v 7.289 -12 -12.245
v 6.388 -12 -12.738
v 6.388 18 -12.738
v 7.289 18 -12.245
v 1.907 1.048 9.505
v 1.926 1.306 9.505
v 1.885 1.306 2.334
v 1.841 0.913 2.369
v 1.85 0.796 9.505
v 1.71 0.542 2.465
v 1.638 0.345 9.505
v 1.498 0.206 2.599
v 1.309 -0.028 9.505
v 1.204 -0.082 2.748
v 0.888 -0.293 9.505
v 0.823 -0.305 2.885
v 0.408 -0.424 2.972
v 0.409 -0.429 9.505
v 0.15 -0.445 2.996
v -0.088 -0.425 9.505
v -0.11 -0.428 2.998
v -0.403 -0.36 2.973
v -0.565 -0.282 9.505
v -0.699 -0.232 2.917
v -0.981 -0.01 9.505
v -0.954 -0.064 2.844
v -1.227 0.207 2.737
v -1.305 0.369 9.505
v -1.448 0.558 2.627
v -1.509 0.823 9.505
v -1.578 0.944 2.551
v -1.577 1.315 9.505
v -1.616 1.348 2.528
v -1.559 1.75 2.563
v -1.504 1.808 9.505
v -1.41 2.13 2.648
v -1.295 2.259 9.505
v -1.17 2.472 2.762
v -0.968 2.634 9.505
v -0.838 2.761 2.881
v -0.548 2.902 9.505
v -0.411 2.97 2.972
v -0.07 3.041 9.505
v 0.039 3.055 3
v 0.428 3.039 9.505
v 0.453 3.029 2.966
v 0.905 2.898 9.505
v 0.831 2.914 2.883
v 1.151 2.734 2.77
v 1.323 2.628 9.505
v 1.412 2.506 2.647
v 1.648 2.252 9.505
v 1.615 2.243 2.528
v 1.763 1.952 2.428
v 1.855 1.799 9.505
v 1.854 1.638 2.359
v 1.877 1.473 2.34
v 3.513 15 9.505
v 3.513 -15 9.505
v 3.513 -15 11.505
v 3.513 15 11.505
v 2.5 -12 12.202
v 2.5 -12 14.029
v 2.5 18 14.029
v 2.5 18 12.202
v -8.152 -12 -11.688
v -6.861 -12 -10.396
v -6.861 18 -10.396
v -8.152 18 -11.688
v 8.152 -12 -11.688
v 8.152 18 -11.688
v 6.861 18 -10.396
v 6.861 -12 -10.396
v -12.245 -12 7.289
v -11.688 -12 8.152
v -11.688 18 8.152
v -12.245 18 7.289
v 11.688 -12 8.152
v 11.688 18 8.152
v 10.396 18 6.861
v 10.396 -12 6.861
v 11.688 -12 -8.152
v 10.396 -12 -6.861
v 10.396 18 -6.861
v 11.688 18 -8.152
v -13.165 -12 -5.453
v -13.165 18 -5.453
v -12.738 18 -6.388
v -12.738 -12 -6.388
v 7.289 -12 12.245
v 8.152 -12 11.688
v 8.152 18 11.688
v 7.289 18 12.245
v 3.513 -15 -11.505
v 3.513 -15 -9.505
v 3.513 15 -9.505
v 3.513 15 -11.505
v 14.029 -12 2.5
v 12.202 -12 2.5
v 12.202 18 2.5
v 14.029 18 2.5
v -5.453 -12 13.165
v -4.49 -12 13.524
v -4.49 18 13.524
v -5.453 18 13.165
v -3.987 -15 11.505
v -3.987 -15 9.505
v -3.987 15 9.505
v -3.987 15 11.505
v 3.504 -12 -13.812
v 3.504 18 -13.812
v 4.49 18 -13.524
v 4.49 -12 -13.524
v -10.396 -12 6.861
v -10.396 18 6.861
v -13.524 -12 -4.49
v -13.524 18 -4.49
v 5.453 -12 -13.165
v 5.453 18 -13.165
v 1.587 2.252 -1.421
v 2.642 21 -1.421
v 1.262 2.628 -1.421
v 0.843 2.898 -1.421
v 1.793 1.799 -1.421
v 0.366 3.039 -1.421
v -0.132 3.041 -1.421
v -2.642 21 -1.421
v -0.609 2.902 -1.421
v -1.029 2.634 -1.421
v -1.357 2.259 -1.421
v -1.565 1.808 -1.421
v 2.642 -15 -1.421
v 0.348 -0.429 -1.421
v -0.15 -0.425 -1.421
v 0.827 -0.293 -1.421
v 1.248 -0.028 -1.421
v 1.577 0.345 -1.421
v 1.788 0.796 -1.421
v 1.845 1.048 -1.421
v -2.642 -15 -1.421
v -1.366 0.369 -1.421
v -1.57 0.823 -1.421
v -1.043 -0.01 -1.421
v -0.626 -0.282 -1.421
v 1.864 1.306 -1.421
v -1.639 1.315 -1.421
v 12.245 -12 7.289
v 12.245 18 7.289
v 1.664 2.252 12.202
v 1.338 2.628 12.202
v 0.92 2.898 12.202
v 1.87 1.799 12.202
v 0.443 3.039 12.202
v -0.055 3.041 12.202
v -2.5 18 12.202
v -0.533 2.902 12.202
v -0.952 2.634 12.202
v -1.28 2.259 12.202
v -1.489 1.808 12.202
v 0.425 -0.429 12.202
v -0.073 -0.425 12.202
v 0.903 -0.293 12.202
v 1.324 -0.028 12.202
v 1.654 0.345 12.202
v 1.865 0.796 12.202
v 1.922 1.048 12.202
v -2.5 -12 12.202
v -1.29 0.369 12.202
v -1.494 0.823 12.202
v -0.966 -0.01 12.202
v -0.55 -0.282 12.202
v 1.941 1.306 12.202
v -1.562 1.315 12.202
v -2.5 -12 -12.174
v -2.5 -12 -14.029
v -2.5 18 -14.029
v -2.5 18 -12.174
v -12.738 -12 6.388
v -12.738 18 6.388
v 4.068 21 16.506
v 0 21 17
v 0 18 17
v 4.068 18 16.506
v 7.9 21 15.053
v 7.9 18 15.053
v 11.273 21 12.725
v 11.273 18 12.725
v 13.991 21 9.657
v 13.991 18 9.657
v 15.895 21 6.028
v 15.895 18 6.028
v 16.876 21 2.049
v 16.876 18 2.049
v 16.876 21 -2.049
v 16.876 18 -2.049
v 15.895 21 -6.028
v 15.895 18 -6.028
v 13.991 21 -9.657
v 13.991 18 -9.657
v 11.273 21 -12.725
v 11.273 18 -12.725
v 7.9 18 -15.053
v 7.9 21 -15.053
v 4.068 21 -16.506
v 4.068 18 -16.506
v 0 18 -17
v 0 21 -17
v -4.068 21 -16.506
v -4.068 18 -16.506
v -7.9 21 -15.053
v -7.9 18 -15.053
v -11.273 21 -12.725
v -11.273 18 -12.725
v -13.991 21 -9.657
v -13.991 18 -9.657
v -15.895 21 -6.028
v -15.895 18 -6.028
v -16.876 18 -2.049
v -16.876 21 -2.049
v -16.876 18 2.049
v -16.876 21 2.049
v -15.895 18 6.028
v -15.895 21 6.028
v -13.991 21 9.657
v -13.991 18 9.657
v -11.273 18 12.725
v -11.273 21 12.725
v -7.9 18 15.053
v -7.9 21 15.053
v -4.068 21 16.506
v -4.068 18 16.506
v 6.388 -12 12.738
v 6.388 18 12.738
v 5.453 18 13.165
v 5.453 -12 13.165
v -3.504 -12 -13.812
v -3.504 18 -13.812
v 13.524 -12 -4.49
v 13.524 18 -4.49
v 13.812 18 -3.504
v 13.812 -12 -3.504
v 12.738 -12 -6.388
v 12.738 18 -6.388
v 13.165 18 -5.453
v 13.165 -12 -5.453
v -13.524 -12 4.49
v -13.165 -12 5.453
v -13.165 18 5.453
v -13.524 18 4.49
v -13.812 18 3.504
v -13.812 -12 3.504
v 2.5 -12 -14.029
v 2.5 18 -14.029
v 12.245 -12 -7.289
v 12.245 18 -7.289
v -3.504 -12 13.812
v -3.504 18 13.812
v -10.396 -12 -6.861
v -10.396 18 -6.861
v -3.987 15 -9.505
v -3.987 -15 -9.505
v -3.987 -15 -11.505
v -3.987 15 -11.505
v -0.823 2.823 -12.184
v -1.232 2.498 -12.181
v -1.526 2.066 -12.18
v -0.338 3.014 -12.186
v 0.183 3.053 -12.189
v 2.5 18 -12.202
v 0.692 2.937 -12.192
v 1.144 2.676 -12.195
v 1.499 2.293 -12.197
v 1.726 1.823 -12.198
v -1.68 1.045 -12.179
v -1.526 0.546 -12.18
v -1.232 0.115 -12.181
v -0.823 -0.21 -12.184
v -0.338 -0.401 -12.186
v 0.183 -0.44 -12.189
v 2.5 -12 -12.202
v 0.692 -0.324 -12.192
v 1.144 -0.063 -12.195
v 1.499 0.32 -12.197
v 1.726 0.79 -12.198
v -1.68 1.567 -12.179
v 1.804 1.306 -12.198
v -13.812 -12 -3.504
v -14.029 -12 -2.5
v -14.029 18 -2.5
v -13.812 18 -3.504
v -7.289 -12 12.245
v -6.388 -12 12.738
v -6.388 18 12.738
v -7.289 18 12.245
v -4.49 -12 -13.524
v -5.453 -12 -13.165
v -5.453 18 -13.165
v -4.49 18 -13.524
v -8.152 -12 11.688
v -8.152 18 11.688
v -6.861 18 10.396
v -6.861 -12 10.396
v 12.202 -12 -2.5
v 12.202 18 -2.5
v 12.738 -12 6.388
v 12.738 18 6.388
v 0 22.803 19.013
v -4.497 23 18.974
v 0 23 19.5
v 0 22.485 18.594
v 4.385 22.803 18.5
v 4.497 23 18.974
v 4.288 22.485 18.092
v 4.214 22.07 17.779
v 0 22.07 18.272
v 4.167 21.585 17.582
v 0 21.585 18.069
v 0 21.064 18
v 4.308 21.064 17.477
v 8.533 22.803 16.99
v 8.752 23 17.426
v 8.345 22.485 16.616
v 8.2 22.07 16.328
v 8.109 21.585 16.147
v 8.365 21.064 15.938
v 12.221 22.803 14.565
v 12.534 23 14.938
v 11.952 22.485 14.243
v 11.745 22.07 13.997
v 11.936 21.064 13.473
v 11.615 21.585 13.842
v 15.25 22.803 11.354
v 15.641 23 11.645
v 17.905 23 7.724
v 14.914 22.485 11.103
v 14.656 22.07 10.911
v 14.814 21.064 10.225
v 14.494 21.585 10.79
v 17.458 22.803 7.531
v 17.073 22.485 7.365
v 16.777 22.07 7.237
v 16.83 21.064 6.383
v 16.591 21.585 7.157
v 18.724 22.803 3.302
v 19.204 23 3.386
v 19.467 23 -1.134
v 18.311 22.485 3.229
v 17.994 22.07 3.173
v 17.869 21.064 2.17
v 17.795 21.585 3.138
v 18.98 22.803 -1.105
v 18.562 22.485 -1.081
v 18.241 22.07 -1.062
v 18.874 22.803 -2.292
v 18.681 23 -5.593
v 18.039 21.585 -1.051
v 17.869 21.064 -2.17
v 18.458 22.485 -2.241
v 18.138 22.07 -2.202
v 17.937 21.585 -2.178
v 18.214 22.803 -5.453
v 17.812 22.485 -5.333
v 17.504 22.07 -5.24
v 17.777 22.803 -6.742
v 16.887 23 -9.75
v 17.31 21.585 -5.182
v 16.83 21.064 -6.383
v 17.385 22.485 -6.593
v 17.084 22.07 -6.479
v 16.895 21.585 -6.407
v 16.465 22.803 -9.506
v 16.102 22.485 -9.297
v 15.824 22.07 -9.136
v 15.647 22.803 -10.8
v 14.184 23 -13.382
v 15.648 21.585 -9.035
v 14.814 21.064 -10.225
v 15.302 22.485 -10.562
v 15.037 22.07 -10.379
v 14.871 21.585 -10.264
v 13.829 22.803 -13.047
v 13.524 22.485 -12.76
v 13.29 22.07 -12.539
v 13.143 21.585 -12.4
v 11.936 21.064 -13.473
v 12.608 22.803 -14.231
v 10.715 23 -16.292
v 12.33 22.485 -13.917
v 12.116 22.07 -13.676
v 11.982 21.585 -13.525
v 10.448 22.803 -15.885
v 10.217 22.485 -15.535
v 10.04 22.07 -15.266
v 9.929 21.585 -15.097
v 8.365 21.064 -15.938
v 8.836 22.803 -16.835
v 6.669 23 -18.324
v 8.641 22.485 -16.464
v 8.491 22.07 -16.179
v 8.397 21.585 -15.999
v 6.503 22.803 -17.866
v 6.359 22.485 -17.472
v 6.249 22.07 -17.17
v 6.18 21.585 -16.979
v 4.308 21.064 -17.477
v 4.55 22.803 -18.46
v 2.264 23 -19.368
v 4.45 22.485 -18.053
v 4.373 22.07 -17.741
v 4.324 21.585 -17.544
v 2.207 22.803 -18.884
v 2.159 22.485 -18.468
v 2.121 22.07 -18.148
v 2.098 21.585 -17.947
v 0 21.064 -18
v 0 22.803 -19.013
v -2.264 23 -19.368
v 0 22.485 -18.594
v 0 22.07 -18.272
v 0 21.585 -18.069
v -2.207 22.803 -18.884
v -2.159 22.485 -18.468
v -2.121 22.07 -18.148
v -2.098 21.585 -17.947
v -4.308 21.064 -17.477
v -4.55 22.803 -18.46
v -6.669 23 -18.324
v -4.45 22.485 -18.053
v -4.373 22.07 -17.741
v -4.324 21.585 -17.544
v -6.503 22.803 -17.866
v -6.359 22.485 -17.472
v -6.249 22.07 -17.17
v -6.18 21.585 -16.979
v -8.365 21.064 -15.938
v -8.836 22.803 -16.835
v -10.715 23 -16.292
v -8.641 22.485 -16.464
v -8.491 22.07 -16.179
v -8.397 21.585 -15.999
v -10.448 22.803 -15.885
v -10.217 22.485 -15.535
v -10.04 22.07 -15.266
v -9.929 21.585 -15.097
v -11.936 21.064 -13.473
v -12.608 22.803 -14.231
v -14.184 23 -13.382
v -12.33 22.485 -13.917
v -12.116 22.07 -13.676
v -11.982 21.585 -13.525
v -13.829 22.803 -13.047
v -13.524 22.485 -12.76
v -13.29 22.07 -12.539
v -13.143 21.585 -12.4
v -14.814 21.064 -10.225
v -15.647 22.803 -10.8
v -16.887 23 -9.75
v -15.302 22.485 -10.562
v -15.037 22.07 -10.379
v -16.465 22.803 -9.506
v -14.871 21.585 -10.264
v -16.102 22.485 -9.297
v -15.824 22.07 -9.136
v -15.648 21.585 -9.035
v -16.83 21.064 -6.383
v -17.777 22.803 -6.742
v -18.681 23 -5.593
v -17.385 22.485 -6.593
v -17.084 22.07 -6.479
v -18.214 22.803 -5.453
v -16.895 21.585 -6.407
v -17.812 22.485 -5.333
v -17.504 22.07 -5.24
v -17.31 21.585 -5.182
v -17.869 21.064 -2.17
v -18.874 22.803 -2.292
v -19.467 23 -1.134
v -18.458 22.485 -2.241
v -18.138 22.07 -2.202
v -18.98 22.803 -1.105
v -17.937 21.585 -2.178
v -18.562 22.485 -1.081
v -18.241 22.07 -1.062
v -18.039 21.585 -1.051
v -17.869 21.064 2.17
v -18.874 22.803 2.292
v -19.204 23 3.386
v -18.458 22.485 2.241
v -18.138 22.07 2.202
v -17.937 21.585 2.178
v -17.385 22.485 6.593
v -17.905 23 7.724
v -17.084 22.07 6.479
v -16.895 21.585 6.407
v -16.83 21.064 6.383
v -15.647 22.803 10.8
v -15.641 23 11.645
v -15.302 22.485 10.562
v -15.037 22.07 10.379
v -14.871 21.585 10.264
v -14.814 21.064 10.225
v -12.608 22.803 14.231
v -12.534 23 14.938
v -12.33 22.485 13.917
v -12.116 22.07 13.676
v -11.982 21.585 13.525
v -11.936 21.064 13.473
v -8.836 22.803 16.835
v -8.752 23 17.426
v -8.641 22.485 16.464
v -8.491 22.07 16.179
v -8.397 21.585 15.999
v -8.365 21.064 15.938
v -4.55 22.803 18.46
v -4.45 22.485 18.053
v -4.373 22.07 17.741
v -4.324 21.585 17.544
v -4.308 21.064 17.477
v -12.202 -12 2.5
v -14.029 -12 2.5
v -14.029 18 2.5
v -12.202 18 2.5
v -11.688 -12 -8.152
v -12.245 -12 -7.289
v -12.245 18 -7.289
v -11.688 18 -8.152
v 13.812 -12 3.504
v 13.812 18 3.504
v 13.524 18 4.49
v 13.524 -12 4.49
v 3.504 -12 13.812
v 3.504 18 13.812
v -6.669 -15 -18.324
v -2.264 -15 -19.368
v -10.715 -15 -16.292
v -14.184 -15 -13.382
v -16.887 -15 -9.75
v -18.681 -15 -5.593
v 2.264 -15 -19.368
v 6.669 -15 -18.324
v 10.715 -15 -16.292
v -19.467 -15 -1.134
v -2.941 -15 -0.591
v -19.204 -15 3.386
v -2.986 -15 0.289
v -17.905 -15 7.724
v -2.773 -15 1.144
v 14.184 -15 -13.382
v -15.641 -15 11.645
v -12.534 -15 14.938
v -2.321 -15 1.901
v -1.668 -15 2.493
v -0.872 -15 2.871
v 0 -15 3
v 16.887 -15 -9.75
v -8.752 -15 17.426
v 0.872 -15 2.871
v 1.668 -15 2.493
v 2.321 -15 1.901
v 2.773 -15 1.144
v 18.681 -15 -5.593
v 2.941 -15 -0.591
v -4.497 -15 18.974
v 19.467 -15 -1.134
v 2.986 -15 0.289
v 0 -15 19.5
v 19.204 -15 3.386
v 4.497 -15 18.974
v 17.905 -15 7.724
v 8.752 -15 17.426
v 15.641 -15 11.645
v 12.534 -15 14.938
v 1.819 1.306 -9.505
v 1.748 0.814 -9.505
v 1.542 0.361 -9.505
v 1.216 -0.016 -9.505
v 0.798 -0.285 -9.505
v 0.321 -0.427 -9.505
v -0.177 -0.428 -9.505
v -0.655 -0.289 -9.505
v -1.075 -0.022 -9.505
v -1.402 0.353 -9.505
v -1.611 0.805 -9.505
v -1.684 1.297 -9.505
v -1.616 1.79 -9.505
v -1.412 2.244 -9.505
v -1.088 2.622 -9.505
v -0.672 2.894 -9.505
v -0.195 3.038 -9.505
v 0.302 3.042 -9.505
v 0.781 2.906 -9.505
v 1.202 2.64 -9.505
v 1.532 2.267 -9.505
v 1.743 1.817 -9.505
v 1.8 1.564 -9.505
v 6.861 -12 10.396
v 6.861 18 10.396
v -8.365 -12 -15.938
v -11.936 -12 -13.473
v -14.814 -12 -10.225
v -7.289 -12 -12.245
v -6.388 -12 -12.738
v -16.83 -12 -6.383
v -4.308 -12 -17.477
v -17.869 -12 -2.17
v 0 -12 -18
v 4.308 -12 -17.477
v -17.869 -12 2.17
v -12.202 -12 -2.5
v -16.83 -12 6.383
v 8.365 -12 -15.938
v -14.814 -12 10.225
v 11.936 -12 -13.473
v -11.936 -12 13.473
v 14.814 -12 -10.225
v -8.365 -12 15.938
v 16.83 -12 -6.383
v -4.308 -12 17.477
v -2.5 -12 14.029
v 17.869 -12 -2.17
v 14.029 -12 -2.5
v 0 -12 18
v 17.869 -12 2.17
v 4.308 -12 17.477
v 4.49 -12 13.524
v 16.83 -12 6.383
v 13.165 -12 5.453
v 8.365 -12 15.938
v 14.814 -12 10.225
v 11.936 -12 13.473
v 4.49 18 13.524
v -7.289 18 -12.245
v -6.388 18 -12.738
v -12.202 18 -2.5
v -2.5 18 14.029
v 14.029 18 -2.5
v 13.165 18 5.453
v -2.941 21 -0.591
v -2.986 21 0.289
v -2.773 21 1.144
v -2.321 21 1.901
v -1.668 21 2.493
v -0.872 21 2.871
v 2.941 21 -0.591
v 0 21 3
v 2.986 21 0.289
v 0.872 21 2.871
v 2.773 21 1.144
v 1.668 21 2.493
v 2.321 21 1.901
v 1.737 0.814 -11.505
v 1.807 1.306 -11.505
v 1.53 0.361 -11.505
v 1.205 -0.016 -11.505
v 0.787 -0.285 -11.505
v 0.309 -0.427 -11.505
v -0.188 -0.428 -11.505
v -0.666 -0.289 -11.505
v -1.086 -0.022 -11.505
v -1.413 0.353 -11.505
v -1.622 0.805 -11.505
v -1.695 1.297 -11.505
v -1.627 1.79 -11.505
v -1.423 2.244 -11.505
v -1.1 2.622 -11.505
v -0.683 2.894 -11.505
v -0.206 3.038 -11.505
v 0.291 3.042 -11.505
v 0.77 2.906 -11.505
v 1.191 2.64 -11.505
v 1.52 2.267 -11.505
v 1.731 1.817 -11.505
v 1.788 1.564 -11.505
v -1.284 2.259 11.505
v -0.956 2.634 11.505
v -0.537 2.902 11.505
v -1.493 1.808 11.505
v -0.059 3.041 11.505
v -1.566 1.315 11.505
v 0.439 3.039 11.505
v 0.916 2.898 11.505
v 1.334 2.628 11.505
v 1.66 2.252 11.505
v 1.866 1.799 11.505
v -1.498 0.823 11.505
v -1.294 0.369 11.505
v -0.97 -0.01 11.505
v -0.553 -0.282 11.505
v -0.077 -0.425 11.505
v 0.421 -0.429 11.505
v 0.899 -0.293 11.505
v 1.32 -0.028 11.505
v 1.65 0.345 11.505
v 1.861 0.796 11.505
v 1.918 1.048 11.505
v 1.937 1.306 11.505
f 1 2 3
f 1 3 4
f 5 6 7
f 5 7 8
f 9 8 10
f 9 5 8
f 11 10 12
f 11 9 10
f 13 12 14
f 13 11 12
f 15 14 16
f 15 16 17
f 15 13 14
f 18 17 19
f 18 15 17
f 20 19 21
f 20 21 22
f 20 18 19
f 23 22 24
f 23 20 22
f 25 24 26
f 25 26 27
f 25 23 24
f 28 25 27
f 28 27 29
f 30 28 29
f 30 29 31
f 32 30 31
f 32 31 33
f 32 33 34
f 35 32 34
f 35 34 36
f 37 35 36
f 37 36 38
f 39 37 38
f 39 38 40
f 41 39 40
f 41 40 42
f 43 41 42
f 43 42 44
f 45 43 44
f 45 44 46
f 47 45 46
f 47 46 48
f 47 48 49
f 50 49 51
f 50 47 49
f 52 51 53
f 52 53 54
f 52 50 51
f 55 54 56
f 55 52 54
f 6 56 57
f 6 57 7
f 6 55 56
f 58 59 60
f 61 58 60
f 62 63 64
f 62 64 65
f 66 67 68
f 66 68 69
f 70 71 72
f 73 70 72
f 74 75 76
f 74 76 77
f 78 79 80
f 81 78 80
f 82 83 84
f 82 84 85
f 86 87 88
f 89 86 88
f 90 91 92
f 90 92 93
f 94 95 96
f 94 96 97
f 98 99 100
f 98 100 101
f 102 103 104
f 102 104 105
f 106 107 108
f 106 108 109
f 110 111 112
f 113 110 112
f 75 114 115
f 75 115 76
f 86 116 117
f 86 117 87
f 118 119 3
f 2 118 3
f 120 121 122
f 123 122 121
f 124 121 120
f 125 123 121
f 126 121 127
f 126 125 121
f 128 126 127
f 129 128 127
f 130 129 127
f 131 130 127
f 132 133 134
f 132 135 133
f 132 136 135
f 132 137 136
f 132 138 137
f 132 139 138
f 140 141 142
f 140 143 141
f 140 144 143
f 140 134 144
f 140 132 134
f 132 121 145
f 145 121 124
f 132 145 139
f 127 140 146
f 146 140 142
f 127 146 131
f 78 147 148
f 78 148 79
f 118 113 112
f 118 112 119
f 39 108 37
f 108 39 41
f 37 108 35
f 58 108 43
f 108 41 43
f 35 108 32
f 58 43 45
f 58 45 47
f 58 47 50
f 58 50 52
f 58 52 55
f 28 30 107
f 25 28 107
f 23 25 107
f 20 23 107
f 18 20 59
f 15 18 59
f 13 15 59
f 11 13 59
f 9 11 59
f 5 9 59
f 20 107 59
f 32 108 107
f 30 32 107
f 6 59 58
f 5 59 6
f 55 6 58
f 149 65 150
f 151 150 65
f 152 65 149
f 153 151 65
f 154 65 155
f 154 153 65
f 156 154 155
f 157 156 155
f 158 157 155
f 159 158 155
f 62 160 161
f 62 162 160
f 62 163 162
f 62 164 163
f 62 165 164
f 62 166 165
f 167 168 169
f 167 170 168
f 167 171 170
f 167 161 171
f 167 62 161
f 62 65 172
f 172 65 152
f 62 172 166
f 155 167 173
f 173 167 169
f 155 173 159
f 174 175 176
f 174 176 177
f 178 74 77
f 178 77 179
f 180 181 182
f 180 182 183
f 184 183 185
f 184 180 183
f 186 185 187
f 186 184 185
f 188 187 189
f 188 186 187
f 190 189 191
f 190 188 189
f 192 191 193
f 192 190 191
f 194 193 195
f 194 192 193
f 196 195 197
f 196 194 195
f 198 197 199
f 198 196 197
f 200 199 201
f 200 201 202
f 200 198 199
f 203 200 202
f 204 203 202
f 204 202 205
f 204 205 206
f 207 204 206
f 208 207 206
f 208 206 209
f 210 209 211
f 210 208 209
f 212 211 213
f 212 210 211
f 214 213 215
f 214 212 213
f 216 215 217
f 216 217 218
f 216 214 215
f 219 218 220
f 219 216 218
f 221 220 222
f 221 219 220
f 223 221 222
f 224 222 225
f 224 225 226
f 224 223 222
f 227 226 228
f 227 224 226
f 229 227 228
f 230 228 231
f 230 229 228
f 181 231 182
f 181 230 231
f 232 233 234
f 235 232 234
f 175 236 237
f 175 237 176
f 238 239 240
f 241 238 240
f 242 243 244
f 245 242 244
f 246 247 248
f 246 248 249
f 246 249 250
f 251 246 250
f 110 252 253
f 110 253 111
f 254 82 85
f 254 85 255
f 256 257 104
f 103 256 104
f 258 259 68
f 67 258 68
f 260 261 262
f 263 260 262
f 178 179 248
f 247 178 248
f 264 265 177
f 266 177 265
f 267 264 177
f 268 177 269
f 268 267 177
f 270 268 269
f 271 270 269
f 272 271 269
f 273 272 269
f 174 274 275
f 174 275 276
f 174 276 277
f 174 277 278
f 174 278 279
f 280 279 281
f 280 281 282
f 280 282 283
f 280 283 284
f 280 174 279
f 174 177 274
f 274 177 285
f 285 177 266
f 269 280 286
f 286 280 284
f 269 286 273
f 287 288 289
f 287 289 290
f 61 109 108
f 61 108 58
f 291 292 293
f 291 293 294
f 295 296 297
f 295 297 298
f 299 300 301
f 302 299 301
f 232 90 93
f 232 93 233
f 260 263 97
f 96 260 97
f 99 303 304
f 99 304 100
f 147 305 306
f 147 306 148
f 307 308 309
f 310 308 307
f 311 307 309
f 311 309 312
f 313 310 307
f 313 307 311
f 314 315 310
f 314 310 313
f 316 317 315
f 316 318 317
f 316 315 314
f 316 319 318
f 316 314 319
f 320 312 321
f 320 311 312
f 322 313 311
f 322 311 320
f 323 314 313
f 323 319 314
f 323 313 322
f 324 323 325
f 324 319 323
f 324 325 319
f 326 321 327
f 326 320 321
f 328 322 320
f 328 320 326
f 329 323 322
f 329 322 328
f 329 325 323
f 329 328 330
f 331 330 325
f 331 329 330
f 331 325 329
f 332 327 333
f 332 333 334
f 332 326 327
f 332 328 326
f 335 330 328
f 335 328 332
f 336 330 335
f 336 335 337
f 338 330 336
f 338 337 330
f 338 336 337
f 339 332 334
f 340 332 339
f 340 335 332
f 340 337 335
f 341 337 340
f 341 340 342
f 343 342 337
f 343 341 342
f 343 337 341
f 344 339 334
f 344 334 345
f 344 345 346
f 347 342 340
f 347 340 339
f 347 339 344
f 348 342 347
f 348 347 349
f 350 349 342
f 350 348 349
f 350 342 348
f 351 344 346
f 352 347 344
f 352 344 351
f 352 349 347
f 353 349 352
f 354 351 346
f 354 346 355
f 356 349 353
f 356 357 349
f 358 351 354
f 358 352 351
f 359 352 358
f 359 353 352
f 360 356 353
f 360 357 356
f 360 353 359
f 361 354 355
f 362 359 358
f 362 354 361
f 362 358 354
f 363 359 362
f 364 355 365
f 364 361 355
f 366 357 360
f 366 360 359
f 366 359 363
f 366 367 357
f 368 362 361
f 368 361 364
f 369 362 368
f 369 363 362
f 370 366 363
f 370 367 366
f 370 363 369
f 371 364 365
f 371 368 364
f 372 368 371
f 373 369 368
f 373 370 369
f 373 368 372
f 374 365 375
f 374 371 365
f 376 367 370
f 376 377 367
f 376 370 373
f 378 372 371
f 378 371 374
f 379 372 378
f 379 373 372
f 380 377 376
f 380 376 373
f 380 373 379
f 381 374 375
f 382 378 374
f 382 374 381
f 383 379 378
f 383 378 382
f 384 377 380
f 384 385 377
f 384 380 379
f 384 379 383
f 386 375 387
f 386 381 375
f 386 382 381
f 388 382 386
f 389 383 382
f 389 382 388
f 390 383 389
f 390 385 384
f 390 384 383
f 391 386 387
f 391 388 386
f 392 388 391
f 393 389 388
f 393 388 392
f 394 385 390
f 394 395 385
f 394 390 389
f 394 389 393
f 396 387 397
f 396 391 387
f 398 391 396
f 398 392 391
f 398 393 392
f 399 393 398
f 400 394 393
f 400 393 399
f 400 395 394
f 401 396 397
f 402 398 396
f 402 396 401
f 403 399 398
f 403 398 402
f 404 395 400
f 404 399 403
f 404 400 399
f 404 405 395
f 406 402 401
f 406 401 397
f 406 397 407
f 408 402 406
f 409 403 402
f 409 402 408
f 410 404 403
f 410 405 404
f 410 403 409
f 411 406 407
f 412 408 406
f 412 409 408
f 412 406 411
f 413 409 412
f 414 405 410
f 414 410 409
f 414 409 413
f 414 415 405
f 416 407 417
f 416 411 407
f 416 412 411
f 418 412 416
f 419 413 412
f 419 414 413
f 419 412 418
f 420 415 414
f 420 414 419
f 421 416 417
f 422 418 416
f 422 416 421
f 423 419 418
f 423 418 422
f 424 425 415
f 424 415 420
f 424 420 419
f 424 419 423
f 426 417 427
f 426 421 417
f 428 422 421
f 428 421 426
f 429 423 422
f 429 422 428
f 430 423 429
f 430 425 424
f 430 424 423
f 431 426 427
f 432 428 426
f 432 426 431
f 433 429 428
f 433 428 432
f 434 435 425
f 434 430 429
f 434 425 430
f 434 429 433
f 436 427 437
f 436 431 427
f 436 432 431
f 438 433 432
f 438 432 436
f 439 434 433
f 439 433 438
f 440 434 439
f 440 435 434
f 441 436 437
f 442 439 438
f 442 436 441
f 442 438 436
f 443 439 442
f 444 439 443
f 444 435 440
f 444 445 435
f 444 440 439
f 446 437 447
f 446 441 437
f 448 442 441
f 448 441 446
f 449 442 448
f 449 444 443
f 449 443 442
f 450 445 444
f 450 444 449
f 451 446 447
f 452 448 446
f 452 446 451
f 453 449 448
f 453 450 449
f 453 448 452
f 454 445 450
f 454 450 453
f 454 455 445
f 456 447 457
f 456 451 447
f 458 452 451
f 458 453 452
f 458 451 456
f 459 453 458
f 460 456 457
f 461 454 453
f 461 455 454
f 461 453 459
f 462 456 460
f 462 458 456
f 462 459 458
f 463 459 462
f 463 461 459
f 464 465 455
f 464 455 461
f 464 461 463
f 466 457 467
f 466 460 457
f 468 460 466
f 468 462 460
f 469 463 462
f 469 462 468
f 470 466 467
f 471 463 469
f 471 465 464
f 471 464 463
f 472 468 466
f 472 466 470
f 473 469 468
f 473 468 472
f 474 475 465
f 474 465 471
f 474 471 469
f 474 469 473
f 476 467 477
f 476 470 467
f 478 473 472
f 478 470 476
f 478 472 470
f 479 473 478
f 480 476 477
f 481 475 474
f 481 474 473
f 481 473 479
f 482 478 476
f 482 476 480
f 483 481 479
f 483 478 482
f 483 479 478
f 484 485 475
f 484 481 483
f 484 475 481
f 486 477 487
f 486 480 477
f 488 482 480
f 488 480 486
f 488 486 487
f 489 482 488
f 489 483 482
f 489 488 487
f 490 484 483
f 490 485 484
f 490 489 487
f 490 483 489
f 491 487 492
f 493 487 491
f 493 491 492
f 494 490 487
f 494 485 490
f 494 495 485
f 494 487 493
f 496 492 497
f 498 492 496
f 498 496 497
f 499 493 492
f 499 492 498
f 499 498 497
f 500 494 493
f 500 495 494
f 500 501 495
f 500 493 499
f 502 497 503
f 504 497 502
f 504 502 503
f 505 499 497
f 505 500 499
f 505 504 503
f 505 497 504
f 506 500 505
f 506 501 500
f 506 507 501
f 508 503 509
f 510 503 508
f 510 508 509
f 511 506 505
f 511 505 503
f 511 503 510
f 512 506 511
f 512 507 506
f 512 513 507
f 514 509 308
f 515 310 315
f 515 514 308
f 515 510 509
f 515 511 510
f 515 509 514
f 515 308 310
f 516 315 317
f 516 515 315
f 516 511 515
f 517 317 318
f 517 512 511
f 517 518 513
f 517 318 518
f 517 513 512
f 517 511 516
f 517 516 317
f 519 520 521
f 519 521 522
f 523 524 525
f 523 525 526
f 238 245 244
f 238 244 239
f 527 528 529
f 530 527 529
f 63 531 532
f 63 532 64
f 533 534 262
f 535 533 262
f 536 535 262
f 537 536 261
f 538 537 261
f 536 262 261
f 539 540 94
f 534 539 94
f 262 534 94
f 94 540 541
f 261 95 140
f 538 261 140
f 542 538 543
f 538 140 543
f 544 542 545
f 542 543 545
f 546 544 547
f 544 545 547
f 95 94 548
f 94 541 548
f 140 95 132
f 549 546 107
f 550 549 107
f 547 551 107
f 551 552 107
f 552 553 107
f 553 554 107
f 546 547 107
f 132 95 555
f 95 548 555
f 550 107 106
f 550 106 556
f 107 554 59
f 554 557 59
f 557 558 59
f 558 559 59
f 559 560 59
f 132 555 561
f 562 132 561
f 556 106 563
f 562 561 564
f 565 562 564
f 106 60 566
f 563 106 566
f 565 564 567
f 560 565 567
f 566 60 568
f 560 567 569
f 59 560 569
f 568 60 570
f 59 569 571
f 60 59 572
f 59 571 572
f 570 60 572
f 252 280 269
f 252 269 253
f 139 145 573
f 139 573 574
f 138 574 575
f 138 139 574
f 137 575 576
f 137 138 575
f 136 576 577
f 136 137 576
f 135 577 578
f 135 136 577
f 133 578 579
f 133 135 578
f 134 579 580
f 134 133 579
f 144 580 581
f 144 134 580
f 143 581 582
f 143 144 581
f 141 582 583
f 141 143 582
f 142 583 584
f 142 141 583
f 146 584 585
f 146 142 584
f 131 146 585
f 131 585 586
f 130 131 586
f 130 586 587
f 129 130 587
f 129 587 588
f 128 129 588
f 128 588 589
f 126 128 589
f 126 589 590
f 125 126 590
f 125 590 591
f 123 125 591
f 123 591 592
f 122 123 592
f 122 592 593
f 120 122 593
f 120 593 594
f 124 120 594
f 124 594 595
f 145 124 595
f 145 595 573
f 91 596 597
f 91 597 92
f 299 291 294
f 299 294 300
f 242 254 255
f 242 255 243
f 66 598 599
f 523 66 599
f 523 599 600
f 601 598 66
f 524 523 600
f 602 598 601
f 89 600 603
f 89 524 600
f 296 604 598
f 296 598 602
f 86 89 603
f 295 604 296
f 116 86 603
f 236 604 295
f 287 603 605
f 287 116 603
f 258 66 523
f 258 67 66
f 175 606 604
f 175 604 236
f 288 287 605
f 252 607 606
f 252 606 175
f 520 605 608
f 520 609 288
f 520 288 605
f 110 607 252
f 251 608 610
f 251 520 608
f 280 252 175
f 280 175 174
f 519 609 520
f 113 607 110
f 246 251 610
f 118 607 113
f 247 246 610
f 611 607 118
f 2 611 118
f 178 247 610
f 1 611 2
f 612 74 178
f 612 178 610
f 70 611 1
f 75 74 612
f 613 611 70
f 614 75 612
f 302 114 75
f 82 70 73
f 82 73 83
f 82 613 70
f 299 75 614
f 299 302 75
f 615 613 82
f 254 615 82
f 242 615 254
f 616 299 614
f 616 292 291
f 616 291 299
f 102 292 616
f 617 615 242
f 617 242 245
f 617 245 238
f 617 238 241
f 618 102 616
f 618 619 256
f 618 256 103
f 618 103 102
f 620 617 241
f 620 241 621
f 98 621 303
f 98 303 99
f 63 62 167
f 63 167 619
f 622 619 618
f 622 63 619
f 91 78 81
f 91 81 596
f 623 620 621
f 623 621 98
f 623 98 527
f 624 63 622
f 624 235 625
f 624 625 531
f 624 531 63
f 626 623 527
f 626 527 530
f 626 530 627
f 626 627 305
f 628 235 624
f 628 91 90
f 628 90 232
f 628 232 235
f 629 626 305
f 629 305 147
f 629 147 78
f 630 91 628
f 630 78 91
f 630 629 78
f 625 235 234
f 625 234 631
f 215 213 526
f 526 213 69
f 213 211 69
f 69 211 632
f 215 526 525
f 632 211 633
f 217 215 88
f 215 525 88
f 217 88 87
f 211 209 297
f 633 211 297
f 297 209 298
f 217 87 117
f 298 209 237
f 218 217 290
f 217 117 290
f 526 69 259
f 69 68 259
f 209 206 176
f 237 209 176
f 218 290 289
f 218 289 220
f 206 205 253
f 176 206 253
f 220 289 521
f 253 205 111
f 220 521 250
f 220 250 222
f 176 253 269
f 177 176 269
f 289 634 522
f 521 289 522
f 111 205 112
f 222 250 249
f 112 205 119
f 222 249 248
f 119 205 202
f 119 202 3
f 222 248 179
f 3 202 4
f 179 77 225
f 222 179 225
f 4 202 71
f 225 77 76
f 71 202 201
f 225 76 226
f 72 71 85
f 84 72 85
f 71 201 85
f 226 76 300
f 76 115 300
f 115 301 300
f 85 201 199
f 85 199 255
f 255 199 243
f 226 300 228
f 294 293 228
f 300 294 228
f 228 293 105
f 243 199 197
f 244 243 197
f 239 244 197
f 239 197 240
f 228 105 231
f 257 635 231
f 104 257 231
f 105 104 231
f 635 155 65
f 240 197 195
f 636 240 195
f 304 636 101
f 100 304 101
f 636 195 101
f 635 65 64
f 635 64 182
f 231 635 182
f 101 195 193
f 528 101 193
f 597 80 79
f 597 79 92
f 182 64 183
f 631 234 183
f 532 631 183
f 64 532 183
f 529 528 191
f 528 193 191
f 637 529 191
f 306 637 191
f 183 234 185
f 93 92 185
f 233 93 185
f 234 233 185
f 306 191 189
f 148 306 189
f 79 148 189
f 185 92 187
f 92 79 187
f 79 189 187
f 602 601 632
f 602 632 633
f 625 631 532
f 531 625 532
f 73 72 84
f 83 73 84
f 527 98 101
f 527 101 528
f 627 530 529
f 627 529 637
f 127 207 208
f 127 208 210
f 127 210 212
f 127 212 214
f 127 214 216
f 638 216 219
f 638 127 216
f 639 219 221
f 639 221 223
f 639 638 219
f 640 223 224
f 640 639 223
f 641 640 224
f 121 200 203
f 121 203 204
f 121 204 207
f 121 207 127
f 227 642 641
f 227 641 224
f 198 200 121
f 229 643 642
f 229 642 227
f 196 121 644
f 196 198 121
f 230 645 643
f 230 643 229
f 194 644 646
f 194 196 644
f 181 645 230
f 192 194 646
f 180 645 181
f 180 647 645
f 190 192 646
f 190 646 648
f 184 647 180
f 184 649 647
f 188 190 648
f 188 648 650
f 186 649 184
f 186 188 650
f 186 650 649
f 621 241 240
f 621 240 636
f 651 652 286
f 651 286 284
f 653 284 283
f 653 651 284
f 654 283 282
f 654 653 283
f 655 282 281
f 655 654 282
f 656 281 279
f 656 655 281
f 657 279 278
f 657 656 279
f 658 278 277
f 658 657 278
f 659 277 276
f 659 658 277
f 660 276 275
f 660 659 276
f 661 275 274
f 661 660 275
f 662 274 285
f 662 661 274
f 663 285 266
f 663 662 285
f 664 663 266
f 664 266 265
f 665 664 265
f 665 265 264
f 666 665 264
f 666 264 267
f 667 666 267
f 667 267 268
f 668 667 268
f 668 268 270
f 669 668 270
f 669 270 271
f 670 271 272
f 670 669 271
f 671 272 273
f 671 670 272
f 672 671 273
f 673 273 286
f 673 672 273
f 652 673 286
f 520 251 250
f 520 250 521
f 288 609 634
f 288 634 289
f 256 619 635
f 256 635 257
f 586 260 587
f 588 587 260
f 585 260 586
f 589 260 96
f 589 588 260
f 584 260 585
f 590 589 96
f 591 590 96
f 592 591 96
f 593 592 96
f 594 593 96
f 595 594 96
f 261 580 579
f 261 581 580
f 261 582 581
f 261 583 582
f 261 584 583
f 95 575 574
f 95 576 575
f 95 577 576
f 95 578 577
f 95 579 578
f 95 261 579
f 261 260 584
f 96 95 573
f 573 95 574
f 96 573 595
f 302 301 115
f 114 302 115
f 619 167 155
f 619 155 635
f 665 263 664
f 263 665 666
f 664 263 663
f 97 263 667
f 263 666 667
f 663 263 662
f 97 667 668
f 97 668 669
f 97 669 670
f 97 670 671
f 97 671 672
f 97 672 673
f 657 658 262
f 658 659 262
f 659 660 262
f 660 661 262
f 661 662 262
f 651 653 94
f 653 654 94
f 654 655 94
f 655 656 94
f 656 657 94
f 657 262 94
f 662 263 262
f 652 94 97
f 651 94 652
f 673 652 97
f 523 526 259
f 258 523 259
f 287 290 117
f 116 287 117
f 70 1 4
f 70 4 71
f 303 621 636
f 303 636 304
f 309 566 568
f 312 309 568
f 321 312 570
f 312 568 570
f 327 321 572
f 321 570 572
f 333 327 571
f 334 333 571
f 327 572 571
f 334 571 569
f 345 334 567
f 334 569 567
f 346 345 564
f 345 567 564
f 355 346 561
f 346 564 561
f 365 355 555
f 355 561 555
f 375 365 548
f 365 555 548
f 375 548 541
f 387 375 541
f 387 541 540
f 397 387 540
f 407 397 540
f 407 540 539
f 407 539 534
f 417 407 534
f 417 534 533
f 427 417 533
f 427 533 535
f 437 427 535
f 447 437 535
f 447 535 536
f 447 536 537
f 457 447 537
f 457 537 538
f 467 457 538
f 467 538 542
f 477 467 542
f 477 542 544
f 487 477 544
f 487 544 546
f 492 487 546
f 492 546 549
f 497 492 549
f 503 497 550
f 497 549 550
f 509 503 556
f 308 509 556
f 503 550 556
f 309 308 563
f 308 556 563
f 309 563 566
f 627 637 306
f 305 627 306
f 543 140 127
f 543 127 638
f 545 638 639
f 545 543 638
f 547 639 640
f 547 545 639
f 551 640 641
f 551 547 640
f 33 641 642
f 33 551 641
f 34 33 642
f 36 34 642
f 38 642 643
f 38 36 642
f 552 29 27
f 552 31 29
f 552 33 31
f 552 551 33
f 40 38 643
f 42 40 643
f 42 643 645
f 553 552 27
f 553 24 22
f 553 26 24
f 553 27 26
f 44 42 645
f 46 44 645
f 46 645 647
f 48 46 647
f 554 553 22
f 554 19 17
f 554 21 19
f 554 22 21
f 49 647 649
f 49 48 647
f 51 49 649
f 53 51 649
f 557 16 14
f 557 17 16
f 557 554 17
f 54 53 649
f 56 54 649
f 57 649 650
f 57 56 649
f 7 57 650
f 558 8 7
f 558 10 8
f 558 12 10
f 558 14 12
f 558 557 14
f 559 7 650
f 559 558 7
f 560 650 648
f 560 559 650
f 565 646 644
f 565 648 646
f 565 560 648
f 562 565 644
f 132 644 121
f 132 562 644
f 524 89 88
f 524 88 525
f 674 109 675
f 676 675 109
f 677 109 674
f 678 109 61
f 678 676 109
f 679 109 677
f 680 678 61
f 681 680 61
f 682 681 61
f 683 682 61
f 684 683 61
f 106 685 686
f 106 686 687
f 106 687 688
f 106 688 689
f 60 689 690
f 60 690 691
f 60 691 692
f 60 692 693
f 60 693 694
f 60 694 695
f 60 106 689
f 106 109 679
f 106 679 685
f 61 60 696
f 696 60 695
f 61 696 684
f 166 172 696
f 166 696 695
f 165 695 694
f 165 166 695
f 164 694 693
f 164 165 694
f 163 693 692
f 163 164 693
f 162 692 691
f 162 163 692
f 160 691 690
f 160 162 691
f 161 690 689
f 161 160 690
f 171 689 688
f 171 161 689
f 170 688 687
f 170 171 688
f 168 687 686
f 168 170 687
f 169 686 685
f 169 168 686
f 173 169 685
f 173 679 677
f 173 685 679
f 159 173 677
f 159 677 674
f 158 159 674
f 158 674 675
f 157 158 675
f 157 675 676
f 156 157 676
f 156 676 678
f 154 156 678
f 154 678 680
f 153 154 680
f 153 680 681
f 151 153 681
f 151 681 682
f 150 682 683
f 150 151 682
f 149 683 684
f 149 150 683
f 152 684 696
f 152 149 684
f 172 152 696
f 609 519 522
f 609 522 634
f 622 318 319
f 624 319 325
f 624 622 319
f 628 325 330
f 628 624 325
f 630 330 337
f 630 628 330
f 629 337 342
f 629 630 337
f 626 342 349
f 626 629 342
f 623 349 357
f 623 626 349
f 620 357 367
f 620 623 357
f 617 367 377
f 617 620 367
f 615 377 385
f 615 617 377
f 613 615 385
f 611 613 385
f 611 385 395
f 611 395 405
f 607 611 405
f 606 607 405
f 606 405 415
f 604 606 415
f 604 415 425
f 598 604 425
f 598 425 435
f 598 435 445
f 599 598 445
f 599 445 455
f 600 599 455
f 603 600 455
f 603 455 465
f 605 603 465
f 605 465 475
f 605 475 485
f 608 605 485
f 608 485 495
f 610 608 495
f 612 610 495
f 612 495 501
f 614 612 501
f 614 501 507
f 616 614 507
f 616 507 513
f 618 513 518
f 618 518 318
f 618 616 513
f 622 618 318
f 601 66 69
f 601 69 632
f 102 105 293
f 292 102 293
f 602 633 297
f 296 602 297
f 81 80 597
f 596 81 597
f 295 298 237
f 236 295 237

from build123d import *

# Parameters (mm, degrees)
SKETCH1_R                = 17
BOSS_EXTRUDE1_DEPTH      = 3
SKETCH3_R                = 17
BOSS_EXTRUDE2_DEPTH      = 3
BOSS_EXTRUDE3_DEPTH      = 31
CUT_EXTRUDE11_DEPTH      = 60
CUT_EXTRUDE11_DEPTH_BACK = 50
SKETCH7_R                = 1.751351815
CUT_EXTRUDE1_DEPTH       = 50
SKETCH8_W                = 7.5
SKETCH8_H                = 2
CUT_EXTRUDE12_DEPTH      = 30
SKETCH9_R                = 19.5
SKETCH9_R_2              = 18
BOSS_EXTRUDE4_DEPTH      = 38
FILLET1_R                = 2
SKETCH10_R               = 19.500000009
SKETCH10_R_2             = 17.00000001
BOSS_EXTRUDE5_DEPTH      = 3


with BuildPart() as part:
    # Sketch1 → Boss-Extrude1 (new body)
    with BuildSketch(Plane(origin=(0, -15, 0), x_dir=(1, 0, 0), z_dir=(0, 1, 0))):
        with Locations(Location((0, 0, 0), (0, 0, 270))):
            Circle(SKETCH1_R)
    extrude(amount=BOSS_EXTRUDE1_DEPTH)



with BuildPart() as body_2:
    # Sketch3 → Boss-Extrude2 (new body)
    with BuildSketch(Plane(origin=(0, 21, 0), x_dir=(1, 0, 0), z_dir=(0, 1, 0))):
        with Locations(Location((0, 0, 0), (0, 0, 270))):
            Circle(SKETCH3_R)
    extrude(amount=-BOSS_EXTRUDE2_DEPTH)


with BuildPart() as part_1:
    add(part.part)

    add(body_2.part)  # Boss-Extrude3 merges body 2
    # Sketch6 → Boss-Extrude3 (add)
    with BuildSketch(Plane(origin=(0, -12, 0), x_dir=(1, 0, 0), z_dir=(0, 1, 0))):
        Polygon((-10.39609313, -6.860559341), (-11.68775931, -8.152225055), (-12.244775891, -7.288892753), (-12.738139369, -6.387668662), (-13.165283017, -5.453239195), (-13.523988426, -4.490460269), (-13.812389225, -3.504338907), (-14.028987847, -2.499999944), (-12.202296406, -2.499999944), (-12.202296406, 2.499999944), (-14.028987847, 2.499999944), (-13.812389225, 3.504338907), (-13.523988426, 4.490460269), (-13.165283017, 5.453239195), (-12.738139369, 6.387668662), (-12.244775891, 7.288892753), (-11.68775931, 8.152225055), (-10.39609313, 6.860559341), (-6.860559341, 10.39609313), (-8.152225055, 11.68775931), (-7.288892753, 12.244775891), (-6.387668662, 12.738139369), (-5.453239195, 13.165283017), (-4.490460269, 13.523988426), (-3.504338907, 13.812389225), (-2.499999944, 14.028987847), (-2.499999944, 12.174172863), (2.499999944, 12.202296406), (2.499999944, 14.028987847), (3.504338907, 13.812389225), (4.490460269, 13.523988426), (5.453239195, 13.165283017), (6.387668662, 12.738139369), (7.288892753, 12.244775891), (8.152225055, 11.68775931), (6.860559341, 10.39609313), (10.39609313, 6.860559341), (11.68775931, 8.152225055), (12.244775891, 7.288892753), (12.738139369, 6.387668662), (13.165283017, 5.453239195), (13.523988426, 4.490460269), (13.812389225, 3.504338907), (14.028987847, 2.499999944), (12.202296406, 2.499999944), (12.202296406, -2.499999944), (14.028987847, -2.499999944), (13.812389225, -3.504338907), (13.523988426, -4.490460269), (13.165283017, -5.453239195), (12.738139369, -6.387668662), (12.244775891, -7.288892753), (11.68775931, -8.152225055), (10.39609313, -6.860559341), (6.860559341, -10.39609313), (8.152225055, -11.68775931), (7.288892753, -12.244775891), (6.387668662, -12.738139369), (5.453239195, -13.165283017), (4.490460269, -13.523988426), (3.504338907, -13.812389225), (2.499999944, -14.028987847), (2.499999944, -12.202296406), (-2.499999944, -12.202296406), (-2.499999944, -14.028987847), (-3.504338907, -13.812389225), (-4.490460269, -13.523988426), (-5.453239195, -13.165283017), (-6.387668662, -12.738139369), (-7.288892753, -12.244775891), (-8.152225055, -11.68775931), (-6.860559341, -10.39609313), align=None)
    extrude(amount=BOSS_EXTRUDE3_DEPTH)

    # Sketch7 → Cut-Extrude11 (cut, two sides: drawn at the far end of the back side and taken through both)
    with BuildSketch(Plane(origin=(-0.068553102, 0, -12.187849043), x_dir=(-0.9999841817006155, 0, 0.005624619858302935), z_dir=(-0.005624619858302935, 0, -0.9999841817006155)).offset(-CUT_EXTRUDE11_DEPTH_BACK)):
        with Locations(Location((-0.120761258, 1.306302196, 0), (0, 0, 180))):
            Circle(SKETCH7_R)
    extrude(amount=CUT_EXTRUDE11_DEPTH + CUT_EXTRUDE11_DEPTH_BACK, mode=Mode.SUBTRACT)

    # Sketch2 → Cut-Extrude1 (cut)
    with BuildSketch(Plane(origin=(0, -15, 0), x_dir=(1, 0, 0), z_dir=(0, 1, 0))):
        with BuildLine():
            Line((2.642344683, 1.420568442), (-2.642344683, 1.420568442))
            ThreePointArc((-2.642344683, 1.420568442), (0, -2.999999869), (2.642344683, 1.420568442))
        make_face()
    extrude(amount=CUT_EXTRUDE1_DEPTH, mode=Mode.SUBTRACT)

    # Sketch8 → Cut-Extrude12 (cut)
    with BuildSketch(Plane(origin=(0, -15, 0), x_dir=(1, 0, 0), z_dir=(0, 1, 0))):
        with Locations((-0.237061367, 10.505385433)):
            Rectangle(SKETCH8_W, SKETCH8_H)
    cut_extrude12 = extrude(amount=CUT_EXTRUDE12_DEPTH, mode=Mode.SUBTRACT)

    # Mirror1: Cut-Extrude12 across plane
    add(cut_extrude12.mirror(Plane.XY), mode=Mode.SUBTRACT)



with BuildPart() as body_2_2:
    # Sketch9 → Boss-Extrude4 (new body)
    with BuildSketch(Plane(origin=(0, -15, 0), x_dir=(1, 0, 0), z_dir=(0, 1, 0))):
        with Locations(Location((0, 0, 0), (0, 0, 270))):
            Circle(SKETCH9_R)
        with Locations(Location((0, 0, 0), (0, 0, 270))):
            Circle(SKETCH9_R_2, mode=Mode.SUBTRACT)
    extrude(amount=BOSS_EXTRUDE4_DEPTH)

    # Fillet1
    # the kernel refuses this fillet: 2 mm, written as the material it takes off along each edge
    with BuildSketch(Plane(origin=(0, 23, 0), x_dir=(0, 0, 1), z_dir=(-1, 0, 0))) as fillet1_piece_1:
        with BuildLine():
            CenterArc((20, -1.936491673), FILLET1_R, 104.477512186, 75.522487814)
            Line((19.5, 0), (19.49, 0.038729833))
            ThreePointArc((19.49, 0.038729833), (18.75, 0.04), (18, 0.04))
            Line((18, 0.04), (17.96, 0))
            Line((17.96, 0), (17.96, -1.936491673))
            Line((17.96, -1.936491673), (18, -1.936491673))
        make_face()
    revolve(axis=Axis((0, 23, 0), (0, 1, 0)), mode=Mode.SUBTRACT)


with BuildPart() as part_2:
    add(part_1.part)

    add(body_2_2.part)  # Boss-Extrude5 merges body 2 2
    # Sketch10 → Boss-Extrude5 (add)
    with BuildSketch(Plane(origin=(0, -15, 0), x_dir=(1, 0, 0), z_dir=(0, 1, 0))):
        with Locations(Location((0, 1.03e-07, 0), (0, 0, 270))):
            Circle(SKETCH10_R)
        with Locations(Location((0, 1.03e-07, 0), (0, 0, 270))):
            Circle(SKETCH10_R_2, mode=Mode.SUBTRACT)
    extrude(amount=BOSS_EXTRUDE5_DEPTH)


solid = part_2.part
